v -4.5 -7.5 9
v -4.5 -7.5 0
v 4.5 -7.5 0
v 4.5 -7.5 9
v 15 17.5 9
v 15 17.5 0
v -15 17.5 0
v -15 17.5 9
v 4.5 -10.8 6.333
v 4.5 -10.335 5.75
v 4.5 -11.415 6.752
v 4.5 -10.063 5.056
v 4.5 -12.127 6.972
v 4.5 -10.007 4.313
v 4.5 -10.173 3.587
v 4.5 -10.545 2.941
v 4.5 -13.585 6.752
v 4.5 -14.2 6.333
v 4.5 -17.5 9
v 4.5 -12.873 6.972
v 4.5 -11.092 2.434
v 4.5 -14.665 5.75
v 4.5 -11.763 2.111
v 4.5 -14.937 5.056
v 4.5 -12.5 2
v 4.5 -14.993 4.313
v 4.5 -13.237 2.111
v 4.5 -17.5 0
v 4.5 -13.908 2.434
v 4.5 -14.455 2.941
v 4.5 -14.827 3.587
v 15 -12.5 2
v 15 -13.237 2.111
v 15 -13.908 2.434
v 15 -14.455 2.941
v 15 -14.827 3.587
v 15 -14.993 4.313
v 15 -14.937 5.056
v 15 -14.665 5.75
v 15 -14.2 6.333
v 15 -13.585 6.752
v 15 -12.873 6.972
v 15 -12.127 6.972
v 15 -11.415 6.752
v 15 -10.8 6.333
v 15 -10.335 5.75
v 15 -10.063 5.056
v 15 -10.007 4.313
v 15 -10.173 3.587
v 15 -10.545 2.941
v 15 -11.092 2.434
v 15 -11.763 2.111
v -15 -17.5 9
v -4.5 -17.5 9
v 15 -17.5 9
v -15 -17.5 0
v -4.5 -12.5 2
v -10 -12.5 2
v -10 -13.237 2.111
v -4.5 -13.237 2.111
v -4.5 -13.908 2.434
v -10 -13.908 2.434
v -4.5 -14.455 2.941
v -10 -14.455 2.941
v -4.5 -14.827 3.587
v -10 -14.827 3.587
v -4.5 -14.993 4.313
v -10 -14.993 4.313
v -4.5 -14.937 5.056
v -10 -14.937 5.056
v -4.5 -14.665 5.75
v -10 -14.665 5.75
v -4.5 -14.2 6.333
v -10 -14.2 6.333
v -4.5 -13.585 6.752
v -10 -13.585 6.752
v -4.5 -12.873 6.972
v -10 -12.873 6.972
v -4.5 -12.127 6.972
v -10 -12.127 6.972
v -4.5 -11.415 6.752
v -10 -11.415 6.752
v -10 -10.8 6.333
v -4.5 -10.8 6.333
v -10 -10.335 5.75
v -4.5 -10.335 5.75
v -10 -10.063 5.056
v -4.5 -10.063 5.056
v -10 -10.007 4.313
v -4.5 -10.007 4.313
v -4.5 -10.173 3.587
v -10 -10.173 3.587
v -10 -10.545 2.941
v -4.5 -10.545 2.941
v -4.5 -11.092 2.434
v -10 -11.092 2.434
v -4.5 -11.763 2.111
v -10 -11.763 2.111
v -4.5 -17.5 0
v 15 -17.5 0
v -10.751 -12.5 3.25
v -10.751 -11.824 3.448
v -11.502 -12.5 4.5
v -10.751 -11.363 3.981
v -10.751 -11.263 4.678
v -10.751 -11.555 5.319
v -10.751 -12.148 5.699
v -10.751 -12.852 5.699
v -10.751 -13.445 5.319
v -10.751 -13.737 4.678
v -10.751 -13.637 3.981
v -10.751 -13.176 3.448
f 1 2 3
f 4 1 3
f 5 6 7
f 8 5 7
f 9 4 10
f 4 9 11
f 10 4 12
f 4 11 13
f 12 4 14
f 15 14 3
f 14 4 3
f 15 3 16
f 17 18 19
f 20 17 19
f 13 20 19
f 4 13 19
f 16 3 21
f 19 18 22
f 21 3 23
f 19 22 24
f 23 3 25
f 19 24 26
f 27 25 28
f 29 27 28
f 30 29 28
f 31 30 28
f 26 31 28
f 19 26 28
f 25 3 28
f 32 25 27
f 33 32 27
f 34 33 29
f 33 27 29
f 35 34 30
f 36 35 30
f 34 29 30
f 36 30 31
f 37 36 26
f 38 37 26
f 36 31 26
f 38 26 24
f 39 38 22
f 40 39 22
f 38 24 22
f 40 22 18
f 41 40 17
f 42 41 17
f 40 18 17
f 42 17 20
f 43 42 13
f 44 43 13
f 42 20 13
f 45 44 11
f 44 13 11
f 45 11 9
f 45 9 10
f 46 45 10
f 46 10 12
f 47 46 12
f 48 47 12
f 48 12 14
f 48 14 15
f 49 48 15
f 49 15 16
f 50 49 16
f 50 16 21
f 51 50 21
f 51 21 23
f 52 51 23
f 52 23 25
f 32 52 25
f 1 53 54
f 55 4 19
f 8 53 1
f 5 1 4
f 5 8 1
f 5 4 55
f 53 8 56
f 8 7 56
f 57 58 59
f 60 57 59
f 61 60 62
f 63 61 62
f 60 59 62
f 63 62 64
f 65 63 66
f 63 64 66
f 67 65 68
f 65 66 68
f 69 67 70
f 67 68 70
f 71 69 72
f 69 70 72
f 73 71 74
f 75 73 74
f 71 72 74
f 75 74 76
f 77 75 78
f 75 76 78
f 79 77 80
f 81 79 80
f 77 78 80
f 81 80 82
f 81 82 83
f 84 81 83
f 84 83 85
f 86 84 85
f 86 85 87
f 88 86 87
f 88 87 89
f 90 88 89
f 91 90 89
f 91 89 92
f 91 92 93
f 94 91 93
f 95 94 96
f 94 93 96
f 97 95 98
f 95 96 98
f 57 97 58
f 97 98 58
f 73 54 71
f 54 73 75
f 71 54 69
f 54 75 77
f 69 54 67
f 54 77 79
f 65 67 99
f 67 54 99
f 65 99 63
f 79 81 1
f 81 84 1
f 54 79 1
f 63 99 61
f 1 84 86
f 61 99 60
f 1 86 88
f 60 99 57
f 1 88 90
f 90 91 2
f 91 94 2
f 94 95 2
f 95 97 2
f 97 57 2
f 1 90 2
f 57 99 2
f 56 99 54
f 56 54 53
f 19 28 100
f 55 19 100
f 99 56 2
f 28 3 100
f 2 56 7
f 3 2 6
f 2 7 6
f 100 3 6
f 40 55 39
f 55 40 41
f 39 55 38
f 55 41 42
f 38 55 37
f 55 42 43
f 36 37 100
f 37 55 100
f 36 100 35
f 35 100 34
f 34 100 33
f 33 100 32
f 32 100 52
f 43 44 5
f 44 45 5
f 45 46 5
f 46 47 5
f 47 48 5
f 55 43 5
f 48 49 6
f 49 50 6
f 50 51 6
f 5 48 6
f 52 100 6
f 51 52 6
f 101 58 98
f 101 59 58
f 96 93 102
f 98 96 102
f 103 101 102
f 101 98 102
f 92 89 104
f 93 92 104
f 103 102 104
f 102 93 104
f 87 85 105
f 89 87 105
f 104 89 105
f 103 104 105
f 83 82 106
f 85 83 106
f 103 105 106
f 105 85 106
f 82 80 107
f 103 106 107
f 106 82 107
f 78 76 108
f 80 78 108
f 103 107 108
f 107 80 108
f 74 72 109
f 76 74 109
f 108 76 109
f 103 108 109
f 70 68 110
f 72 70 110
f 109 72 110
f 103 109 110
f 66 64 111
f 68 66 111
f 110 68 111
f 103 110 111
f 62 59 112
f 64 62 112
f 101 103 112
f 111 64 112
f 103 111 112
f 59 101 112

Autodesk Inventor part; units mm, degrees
ref_plane "YZ Plane" through (0, 0, 0) normal (1, 0, 0) x (0, 1, 0)
ref_plane "XZ Plane" through (0, 0, 0) normal (0, 1, 0) x (-1, 0, 0)
ref_plane "XY Plane" through (0, 0, 0) normal (0, 0, 1) x (1, 0, 0)
sketch "Boceto1" plane through (0, 0, 0) normal (0, 0, 1) x (1, 0, 0)
  line L0 (15, -17.5) -> (15, 17.5)
  line L1 (15, 17.5) -> (-15, 17.5)
  line L2 (-15, 17.5) -> (-15, -17.5)
  line L3 (-15, -17.5) -> (-5, -17.5)
  line L4 (5, -17.5) -> (15, -17.5)
  line L5 (-4.5, -17.5) -> (-4.5, -7.5)
  line L6 (-4.5, -7.5) -> (4.5, -7.5)
  line L7 (4.5, -7.5) -> (4.5, -17.5)
  line L8 (-4.5, -17.5) -> (-5, -17.5)
  line L9 (4.5, -17.5) -> (5, -17.5)
  point P0 (0, 0)
  point P1 (15, 0)
  point P2 (0, -7.5)
  point P3 (0, -17.5)
  dimension "d0" = 30
  dimension "d1" = 35
  dimension "d7" = 10
  dimension "d8" = 9
  dimension "d9" = 15
extrude "Extrusión2" add sketch "Boceto1" along normal blind 9
sketch "Boceto2" plane through (15, -17.5, 0) normal (1, 0, 0) x (0, 0, -1)
  line L0 (0, 35) -> (0, 0) projected
  line L1 (0, 35) -> (-9, 35) projected
  line L2 (-9, 0) -> (-9, 35) projected
  line L3 (0, 0) -> (-9, 0) projected
  point P0 (0, 17.5)
  point P1 (-4.5, 5)
  dimension "d12" = 4.5
  dimension "d13" = 5
hole "Agujero1" at (15, -12.5, 4.5) direction (-1, 0, 0) diameter 5 depth 25 tip angle 118
properties part number "Tope para Motor" material "Abedul"
